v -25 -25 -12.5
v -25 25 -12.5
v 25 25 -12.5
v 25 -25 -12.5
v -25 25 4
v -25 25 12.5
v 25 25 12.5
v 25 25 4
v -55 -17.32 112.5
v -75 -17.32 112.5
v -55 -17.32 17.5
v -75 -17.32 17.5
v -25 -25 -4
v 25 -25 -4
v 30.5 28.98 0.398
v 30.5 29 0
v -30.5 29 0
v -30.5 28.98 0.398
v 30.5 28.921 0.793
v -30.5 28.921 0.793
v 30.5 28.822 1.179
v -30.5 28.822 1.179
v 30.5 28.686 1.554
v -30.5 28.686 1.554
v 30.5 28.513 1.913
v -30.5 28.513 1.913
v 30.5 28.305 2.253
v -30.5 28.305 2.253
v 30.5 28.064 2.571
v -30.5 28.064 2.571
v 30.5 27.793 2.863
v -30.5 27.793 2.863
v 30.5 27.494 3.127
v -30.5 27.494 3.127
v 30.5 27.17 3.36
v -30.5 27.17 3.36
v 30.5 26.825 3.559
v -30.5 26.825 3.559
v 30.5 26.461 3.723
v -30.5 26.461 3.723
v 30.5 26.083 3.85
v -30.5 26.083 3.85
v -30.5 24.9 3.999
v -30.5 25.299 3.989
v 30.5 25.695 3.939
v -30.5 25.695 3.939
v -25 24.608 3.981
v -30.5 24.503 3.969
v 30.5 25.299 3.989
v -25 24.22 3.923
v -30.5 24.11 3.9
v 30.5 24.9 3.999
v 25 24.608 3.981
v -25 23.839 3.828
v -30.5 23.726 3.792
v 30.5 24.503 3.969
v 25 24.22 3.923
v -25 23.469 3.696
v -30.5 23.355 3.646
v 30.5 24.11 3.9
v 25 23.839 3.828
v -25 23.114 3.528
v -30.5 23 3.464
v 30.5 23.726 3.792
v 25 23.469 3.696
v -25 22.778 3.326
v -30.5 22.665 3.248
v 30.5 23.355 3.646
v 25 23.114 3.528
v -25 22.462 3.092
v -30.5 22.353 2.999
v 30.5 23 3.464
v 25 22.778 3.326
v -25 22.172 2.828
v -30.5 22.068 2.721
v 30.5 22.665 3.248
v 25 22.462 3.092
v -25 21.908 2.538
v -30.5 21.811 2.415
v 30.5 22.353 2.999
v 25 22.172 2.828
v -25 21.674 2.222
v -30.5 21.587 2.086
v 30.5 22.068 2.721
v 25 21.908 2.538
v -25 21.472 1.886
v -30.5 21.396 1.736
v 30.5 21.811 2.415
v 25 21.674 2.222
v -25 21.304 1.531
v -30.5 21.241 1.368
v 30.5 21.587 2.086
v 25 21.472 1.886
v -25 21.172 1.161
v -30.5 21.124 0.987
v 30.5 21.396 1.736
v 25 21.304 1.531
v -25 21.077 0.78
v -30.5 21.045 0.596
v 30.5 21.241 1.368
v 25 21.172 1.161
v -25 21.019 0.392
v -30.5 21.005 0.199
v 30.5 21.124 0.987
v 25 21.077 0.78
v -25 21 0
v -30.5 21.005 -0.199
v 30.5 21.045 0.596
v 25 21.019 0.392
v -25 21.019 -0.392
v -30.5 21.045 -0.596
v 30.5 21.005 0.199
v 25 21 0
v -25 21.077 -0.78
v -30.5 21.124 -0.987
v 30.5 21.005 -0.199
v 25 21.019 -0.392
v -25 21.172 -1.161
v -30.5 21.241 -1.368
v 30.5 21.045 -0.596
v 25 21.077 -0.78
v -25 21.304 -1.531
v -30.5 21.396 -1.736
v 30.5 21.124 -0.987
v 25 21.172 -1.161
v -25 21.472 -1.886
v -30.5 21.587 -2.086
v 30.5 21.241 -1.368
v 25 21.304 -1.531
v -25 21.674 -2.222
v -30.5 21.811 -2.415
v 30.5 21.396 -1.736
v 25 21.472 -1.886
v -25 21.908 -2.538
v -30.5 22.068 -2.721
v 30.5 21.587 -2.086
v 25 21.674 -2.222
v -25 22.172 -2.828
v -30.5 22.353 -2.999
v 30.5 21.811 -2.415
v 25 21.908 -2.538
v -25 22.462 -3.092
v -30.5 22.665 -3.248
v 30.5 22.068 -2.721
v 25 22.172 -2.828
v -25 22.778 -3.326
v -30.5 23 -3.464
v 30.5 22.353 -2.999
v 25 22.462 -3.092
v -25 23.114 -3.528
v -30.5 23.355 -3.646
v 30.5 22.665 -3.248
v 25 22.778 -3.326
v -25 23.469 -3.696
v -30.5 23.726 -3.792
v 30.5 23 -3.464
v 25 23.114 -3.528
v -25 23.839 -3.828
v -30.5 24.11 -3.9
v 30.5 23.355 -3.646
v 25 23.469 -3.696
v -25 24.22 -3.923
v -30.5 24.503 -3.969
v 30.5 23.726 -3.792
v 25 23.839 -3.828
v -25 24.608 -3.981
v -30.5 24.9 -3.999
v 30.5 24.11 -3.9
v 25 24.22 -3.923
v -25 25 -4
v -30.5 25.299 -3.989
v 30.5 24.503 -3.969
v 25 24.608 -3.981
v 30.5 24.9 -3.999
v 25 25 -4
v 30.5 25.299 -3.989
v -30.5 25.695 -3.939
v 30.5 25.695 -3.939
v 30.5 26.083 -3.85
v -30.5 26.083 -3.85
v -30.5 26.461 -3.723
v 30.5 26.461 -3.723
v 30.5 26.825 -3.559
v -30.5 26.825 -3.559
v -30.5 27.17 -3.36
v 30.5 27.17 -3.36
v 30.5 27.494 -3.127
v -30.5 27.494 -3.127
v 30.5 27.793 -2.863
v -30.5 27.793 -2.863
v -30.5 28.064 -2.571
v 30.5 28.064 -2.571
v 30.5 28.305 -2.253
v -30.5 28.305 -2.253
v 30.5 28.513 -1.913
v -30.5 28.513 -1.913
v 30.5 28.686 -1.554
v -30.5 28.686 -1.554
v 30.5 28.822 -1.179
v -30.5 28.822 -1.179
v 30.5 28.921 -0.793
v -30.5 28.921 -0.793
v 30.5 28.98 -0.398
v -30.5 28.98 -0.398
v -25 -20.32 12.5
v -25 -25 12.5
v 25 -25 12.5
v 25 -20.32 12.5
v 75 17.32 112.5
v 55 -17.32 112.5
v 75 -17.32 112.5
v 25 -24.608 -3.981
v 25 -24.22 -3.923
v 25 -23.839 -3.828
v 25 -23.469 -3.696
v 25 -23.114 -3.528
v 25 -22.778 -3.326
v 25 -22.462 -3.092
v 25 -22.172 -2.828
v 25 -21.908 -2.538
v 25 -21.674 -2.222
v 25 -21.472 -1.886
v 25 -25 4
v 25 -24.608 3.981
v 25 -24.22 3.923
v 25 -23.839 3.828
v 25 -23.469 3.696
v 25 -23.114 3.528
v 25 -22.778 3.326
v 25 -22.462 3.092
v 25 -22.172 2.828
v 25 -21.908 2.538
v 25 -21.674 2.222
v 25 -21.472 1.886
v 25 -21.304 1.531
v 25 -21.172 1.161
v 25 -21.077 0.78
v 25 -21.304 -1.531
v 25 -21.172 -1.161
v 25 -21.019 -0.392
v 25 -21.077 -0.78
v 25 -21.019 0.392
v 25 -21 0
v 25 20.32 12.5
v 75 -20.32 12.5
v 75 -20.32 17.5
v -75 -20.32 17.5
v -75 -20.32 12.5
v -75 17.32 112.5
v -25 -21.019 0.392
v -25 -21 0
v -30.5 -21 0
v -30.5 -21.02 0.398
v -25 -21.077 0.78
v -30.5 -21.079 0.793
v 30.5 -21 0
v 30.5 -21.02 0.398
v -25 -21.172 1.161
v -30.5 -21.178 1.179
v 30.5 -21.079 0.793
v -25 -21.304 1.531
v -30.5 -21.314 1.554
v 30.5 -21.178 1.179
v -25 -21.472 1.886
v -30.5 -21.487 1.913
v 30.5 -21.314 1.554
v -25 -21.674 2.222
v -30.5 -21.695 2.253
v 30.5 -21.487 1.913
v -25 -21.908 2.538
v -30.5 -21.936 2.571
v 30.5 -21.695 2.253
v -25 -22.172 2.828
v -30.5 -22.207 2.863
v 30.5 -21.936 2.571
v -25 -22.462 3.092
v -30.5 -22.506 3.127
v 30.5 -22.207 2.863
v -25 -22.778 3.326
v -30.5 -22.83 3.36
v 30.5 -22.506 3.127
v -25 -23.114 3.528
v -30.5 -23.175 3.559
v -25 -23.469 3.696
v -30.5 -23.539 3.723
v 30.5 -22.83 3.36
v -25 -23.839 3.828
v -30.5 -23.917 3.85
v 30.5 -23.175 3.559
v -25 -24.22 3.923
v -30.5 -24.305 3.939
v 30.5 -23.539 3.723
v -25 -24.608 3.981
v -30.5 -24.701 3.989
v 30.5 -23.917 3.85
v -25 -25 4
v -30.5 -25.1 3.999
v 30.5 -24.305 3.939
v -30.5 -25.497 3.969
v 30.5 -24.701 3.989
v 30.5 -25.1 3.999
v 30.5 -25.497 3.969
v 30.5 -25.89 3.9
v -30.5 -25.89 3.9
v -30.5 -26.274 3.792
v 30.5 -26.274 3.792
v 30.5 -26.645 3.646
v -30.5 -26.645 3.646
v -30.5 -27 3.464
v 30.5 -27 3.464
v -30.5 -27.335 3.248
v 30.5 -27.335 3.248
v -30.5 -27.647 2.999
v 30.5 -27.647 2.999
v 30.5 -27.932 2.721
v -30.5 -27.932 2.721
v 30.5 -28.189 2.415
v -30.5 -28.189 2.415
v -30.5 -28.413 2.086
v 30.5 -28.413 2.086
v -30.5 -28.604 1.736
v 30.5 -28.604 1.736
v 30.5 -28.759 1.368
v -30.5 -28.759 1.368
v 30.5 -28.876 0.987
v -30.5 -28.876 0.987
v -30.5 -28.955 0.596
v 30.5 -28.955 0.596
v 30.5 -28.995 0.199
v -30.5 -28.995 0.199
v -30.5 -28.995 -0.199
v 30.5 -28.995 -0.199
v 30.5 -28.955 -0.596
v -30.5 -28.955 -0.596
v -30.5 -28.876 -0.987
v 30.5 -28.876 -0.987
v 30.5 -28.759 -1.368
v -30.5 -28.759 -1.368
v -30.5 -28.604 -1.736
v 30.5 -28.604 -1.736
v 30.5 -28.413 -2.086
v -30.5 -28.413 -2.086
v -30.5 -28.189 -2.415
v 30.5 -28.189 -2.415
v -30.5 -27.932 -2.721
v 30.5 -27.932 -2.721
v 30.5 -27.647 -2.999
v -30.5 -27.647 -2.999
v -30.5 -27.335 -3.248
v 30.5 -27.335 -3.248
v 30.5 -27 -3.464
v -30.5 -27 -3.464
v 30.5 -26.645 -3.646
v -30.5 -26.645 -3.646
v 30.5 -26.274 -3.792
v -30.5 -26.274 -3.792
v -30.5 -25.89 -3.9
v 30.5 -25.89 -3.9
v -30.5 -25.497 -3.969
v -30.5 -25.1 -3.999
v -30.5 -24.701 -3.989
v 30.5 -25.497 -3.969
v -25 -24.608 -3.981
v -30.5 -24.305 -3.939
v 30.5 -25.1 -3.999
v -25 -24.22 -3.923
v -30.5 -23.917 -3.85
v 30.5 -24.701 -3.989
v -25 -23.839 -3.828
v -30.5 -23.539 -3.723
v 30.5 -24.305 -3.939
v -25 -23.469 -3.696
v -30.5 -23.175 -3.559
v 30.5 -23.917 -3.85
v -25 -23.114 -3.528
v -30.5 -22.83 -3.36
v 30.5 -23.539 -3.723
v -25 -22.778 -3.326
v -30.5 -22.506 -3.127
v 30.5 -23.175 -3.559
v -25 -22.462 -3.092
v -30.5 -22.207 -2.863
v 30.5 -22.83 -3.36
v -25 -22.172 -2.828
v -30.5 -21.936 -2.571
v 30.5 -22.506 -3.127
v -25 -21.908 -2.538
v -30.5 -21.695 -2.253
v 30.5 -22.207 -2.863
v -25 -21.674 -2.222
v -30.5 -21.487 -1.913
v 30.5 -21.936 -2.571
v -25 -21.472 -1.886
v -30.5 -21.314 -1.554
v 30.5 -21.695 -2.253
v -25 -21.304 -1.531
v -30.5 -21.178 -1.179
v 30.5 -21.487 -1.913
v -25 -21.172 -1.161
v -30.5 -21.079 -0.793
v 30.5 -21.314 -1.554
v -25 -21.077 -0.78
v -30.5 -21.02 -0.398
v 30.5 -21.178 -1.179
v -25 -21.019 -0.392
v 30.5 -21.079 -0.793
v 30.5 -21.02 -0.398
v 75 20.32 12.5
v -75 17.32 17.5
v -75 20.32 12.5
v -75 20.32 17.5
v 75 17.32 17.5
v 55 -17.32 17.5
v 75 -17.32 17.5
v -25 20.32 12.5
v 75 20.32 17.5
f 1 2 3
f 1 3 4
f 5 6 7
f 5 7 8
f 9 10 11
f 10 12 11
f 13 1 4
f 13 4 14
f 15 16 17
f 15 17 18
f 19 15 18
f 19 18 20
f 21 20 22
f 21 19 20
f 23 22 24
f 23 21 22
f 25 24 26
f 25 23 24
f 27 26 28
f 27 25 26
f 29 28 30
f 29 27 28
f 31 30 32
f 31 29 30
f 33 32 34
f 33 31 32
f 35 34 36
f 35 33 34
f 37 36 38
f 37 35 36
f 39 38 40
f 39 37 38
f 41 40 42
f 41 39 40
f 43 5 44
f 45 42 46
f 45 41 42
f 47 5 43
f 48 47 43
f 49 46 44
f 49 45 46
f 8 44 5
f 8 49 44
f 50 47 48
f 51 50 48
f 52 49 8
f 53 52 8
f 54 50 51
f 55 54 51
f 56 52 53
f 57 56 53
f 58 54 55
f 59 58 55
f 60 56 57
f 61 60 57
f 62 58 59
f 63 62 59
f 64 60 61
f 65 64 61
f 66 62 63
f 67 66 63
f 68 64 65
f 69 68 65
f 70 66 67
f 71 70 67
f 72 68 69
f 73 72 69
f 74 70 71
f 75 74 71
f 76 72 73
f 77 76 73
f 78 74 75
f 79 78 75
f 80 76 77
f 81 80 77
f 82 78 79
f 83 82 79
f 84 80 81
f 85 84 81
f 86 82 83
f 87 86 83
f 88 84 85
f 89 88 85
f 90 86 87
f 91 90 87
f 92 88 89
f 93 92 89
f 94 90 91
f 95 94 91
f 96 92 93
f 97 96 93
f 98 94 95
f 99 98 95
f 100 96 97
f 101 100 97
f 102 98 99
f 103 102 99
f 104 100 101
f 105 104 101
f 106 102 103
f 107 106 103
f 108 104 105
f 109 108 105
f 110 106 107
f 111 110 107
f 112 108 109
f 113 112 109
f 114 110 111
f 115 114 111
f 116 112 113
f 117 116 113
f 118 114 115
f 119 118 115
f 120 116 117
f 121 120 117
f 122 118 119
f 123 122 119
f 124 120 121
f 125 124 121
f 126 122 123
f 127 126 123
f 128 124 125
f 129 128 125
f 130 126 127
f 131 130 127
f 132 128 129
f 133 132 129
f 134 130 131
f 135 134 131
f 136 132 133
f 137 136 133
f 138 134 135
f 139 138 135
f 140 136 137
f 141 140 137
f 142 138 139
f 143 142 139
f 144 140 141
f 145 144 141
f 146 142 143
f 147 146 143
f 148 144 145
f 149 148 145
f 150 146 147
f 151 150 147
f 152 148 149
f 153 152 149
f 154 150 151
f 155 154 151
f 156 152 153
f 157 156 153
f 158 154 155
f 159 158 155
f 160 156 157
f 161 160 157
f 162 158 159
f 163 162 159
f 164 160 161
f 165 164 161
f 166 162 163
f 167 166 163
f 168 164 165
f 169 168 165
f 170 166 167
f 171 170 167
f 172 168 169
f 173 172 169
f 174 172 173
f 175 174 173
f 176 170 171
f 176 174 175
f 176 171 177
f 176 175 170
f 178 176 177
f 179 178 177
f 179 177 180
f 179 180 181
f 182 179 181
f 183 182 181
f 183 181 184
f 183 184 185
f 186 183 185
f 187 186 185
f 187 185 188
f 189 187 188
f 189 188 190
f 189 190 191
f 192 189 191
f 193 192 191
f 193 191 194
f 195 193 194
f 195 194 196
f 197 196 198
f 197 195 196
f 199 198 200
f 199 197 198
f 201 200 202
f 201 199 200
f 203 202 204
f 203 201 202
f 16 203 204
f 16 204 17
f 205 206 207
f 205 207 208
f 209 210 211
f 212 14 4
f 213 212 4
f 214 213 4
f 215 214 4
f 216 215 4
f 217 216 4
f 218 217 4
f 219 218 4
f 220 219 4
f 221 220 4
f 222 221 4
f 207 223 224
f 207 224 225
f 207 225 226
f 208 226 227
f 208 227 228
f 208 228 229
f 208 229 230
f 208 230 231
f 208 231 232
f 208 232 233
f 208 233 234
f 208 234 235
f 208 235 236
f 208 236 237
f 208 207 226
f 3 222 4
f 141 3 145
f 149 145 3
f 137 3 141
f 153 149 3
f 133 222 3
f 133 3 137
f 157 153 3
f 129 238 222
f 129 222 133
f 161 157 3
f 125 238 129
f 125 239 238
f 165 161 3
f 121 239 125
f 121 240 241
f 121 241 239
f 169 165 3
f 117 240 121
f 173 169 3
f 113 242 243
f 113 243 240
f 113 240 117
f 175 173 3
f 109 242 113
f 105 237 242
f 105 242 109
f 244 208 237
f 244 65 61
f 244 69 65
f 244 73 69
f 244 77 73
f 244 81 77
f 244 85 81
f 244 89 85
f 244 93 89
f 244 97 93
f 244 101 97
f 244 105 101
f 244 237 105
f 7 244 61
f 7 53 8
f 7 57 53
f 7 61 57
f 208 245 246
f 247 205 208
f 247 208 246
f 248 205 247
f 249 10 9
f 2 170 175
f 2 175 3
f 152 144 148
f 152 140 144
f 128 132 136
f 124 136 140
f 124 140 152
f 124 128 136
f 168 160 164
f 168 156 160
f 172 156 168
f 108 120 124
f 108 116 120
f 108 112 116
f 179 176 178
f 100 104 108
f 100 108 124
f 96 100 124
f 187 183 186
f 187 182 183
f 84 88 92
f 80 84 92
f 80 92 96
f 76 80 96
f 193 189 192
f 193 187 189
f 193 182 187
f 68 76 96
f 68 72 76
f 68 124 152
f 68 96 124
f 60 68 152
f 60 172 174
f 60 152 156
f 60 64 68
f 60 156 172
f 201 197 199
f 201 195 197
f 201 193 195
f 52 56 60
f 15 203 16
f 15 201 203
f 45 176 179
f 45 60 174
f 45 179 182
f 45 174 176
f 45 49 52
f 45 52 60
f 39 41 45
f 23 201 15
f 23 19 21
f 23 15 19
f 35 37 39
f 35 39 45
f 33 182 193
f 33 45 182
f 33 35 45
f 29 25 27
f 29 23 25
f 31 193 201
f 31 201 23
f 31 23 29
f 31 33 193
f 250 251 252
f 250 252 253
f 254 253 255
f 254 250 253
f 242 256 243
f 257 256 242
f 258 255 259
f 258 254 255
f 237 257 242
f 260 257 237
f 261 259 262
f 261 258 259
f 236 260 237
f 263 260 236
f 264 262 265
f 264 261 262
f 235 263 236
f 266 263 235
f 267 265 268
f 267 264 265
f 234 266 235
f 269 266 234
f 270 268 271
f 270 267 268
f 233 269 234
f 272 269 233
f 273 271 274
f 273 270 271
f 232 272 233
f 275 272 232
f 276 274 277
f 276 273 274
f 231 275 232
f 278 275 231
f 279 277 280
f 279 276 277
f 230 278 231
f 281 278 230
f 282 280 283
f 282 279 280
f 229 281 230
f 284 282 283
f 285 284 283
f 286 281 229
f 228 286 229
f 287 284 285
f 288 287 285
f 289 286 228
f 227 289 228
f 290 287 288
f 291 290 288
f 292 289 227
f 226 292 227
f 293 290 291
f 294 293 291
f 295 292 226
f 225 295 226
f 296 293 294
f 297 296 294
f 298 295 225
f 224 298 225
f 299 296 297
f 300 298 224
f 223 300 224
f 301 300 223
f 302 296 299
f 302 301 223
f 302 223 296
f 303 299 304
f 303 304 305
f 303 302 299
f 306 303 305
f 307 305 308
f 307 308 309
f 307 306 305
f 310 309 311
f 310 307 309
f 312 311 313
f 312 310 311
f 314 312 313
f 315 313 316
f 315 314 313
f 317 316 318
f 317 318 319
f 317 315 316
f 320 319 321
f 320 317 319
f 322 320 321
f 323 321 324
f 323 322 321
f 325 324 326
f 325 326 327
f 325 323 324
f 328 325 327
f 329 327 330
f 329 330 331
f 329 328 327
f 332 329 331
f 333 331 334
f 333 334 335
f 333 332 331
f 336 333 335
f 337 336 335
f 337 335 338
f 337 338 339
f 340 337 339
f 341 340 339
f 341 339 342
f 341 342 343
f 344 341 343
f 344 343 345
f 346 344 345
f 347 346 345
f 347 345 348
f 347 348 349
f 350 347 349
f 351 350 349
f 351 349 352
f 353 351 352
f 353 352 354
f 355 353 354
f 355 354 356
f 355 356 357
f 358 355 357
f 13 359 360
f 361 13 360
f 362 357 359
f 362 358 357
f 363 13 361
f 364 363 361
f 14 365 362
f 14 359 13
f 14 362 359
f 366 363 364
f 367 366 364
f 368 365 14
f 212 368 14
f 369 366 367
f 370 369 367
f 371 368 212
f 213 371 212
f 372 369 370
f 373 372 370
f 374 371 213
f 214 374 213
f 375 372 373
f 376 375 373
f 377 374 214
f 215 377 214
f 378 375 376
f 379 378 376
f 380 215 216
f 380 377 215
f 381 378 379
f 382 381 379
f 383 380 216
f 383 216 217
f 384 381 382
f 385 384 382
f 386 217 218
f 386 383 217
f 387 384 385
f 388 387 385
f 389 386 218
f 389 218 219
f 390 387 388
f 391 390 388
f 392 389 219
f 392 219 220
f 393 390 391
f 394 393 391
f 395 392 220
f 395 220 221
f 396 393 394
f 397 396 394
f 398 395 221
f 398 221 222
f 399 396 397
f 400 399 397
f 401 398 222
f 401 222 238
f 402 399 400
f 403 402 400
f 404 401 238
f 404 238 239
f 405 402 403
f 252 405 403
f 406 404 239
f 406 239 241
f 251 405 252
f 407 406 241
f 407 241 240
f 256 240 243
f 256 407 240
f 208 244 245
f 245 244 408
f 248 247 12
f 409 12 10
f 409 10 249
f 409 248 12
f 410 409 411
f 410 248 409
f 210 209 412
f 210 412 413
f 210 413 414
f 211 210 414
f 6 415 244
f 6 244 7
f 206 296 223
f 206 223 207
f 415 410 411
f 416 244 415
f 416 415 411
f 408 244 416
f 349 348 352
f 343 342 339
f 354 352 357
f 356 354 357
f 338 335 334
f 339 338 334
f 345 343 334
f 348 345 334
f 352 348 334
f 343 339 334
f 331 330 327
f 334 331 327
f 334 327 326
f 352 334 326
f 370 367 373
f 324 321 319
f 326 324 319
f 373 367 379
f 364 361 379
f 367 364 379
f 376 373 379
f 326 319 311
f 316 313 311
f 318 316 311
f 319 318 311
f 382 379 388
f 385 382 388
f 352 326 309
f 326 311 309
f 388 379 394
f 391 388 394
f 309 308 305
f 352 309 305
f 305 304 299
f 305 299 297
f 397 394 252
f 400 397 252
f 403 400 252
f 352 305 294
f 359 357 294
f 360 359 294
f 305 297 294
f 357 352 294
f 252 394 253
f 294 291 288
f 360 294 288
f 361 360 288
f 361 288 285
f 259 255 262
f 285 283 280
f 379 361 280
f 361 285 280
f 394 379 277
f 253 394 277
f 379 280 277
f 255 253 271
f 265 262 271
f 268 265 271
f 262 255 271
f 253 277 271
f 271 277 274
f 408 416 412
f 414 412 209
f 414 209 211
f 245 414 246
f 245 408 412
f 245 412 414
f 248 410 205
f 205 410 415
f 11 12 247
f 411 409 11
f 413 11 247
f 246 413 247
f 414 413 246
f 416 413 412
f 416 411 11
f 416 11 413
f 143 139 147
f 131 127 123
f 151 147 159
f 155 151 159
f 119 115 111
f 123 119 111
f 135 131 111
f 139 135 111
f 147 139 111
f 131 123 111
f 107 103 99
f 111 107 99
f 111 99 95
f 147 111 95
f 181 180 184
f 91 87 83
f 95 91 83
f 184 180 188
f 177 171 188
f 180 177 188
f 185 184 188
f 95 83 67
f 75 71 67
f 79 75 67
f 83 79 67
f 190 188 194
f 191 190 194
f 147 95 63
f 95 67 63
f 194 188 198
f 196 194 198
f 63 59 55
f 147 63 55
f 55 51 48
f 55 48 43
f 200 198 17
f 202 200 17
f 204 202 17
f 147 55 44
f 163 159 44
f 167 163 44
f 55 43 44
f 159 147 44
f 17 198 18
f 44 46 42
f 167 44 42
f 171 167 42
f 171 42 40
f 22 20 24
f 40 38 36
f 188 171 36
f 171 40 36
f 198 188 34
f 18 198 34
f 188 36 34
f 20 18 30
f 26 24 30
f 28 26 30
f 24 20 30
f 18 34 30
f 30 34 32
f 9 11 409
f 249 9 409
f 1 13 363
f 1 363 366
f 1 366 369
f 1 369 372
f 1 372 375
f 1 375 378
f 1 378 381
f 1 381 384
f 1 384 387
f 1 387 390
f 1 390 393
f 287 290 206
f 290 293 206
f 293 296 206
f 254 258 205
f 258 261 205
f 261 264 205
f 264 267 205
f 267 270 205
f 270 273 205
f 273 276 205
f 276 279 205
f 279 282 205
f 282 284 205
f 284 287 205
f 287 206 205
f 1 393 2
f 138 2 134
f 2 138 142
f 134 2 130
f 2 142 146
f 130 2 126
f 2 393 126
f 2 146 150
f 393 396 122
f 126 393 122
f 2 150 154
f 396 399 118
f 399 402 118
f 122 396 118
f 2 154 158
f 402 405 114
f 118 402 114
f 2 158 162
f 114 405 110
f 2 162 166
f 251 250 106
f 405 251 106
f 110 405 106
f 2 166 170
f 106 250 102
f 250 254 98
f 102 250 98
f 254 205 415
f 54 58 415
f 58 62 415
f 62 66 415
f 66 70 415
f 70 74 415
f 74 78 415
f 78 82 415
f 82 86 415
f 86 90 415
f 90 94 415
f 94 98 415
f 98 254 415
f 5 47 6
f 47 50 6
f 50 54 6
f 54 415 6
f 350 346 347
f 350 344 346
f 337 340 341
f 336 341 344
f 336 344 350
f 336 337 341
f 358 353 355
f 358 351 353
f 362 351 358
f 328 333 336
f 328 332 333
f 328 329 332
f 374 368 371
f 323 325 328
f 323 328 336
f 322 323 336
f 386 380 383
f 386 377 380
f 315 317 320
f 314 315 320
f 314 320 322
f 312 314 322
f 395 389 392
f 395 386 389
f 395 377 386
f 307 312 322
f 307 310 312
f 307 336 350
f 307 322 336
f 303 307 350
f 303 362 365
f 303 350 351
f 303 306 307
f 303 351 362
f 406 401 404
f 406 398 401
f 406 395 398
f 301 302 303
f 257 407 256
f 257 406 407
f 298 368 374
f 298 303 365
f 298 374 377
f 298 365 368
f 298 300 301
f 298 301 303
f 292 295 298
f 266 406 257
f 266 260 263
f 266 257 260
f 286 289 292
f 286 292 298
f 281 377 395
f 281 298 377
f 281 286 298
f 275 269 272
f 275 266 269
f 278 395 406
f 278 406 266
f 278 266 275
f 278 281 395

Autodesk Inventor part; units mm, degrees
ref_plane "YZ Plane" through (0, 0, 0) normal (1, 0, 0) x (0, 1, 0)
ref_plane "XZ Plane" through (0, 0, 0) normal (0, 1, 0) x (-1, 0, 0)
ref_plane "XY Plane" through (0, 0, 0) normal (0, 0, 1) x (1, 0, 0)
sketch "Esquisse1" plane through (0, 0, 0) normal (1, 0, 0) x (0, 1, 0)
  line L0 (25, -12.5) -> (-25, -12.5)
  line L1 (-25, -12.5) -> (-25, 12.5)
  line L2 (-25, 12.5) -> (25, 12.5)
  line L3 (25, 12.5) -> (25, -12.5)
  line L4 (25, -12.5) -> (-25, 12.5) construction
  line L5 (-25, -12.5) -> (25, 12.5) construction
  circle A0 centre (25, 0) radius 12.5
  circle A1 centre (25, 0) radius 4
  circle A2 centre (-25, 0) radius 4
  circle A3 centre (-25, 0) radius 12.5
  point P0 (0, 0)
  point P1 (-25, -12.5)
  point P2 (25, -12.5)
  point P3 (25, -4)
  point P4 (25, 4)
  point P5 (-25, 4)
  point P6 (-25, -4)
  dimension "d1" = 25
  dimension "d0" = 8
  dimension "d2" = 50
extrude "Extrusion1" add sketch "Esquisse1" along normal mid plane 61 contours A1 L3 | L3 A1 | A2 L1 | L1 A2
extrude "Extrusion2" add sketch "Esquisse1" along normal mid plane 50 contours A0 L3 A1 | L0 A3 L2 A0 | L1 A2 A3 picked at (24.0029, -9.5456) picked at (-15.4378, -0.9272)
sketch "Esquisse2" plane through (-25, -25, 12.5) normal (0, 0, 1) x (1, 0, 0)
  line L0 (0, 0) -> (0, 50) projected
  line L1 (50, 50) -> (50, 0) projected
  line L2 (0, 0) -> (50, 0) projected
  line L3 (-50, 7.6795) -> (-30, 7.6795)
  line L4 (-30, 7.6795) -> (25, 7.6795)
  line L5 (25, 7.6795) -> (80, 7.6795)
  line L6 (80, 7.6795) -> (100, 7.6795)
  line L7 (100, 7.6795) -> (100, 42.3205)
  line L8 (100, 42.3205) -> (80, 7.6795)
  line L9 (-30, 7.6795) -> (-50, 42.3205)
  line L10 (-50, 42.3205) -> (-50, 7.6795)
  line L11 (25, -15.6) -> (25, 65.6) projected
  line L12 (-50, 45.3205) -> (100, 45.3205)
  line L13 (100, 45.3205) -> (100, 4.6795)
  line L14 (100, 4.6795) -> (-50, 4.6795)
  line L15 (-50, 4.6795) -> (-50, 45.3205)
  line L16 (-50, 42.3205) -> (-50, 45.3205) construction
  line L17 (-50, 7.6795) -> (-50, 4.6795) construction
  line L18 (100, 42.3205) -> (100, 45.3205) construction
  line L19 (100, 7.6795) -> (100, 4.6795) construction
  line L20 (-50, 4.6795) -> (25, 25) construction
  line L21 (25, 25) -> (100, 45.3205) construction
  dimension "d14" = 34.641
  dimension "d15" = 110
  dimension "d16" = 20
  dimension "d17" = 17.3205
  dimension "d18" = 60
  dimension "d22" = 3
extrude "Extrusion3" add sketch "Esquisse2" along normal blind 100 contours L3 L10 L9 | L8 L7 L6
extrude "Extrusion4" add sketch "Esquisse2" along normal blind 5 contours L14 L15 L3 L4 L0 | L0 L4 L11 L14 | L4 L9 L15 L12 L0 | L0 L12 L11 L4 | L11 L5 L1 L14 | L3 L10 L9 | L11 L12 L1 L5 | L1 L5 L6 L13 L14 | L1 L12 L13 L8 L5 | L8 L7 L6
properties part number "Doigt trans"
